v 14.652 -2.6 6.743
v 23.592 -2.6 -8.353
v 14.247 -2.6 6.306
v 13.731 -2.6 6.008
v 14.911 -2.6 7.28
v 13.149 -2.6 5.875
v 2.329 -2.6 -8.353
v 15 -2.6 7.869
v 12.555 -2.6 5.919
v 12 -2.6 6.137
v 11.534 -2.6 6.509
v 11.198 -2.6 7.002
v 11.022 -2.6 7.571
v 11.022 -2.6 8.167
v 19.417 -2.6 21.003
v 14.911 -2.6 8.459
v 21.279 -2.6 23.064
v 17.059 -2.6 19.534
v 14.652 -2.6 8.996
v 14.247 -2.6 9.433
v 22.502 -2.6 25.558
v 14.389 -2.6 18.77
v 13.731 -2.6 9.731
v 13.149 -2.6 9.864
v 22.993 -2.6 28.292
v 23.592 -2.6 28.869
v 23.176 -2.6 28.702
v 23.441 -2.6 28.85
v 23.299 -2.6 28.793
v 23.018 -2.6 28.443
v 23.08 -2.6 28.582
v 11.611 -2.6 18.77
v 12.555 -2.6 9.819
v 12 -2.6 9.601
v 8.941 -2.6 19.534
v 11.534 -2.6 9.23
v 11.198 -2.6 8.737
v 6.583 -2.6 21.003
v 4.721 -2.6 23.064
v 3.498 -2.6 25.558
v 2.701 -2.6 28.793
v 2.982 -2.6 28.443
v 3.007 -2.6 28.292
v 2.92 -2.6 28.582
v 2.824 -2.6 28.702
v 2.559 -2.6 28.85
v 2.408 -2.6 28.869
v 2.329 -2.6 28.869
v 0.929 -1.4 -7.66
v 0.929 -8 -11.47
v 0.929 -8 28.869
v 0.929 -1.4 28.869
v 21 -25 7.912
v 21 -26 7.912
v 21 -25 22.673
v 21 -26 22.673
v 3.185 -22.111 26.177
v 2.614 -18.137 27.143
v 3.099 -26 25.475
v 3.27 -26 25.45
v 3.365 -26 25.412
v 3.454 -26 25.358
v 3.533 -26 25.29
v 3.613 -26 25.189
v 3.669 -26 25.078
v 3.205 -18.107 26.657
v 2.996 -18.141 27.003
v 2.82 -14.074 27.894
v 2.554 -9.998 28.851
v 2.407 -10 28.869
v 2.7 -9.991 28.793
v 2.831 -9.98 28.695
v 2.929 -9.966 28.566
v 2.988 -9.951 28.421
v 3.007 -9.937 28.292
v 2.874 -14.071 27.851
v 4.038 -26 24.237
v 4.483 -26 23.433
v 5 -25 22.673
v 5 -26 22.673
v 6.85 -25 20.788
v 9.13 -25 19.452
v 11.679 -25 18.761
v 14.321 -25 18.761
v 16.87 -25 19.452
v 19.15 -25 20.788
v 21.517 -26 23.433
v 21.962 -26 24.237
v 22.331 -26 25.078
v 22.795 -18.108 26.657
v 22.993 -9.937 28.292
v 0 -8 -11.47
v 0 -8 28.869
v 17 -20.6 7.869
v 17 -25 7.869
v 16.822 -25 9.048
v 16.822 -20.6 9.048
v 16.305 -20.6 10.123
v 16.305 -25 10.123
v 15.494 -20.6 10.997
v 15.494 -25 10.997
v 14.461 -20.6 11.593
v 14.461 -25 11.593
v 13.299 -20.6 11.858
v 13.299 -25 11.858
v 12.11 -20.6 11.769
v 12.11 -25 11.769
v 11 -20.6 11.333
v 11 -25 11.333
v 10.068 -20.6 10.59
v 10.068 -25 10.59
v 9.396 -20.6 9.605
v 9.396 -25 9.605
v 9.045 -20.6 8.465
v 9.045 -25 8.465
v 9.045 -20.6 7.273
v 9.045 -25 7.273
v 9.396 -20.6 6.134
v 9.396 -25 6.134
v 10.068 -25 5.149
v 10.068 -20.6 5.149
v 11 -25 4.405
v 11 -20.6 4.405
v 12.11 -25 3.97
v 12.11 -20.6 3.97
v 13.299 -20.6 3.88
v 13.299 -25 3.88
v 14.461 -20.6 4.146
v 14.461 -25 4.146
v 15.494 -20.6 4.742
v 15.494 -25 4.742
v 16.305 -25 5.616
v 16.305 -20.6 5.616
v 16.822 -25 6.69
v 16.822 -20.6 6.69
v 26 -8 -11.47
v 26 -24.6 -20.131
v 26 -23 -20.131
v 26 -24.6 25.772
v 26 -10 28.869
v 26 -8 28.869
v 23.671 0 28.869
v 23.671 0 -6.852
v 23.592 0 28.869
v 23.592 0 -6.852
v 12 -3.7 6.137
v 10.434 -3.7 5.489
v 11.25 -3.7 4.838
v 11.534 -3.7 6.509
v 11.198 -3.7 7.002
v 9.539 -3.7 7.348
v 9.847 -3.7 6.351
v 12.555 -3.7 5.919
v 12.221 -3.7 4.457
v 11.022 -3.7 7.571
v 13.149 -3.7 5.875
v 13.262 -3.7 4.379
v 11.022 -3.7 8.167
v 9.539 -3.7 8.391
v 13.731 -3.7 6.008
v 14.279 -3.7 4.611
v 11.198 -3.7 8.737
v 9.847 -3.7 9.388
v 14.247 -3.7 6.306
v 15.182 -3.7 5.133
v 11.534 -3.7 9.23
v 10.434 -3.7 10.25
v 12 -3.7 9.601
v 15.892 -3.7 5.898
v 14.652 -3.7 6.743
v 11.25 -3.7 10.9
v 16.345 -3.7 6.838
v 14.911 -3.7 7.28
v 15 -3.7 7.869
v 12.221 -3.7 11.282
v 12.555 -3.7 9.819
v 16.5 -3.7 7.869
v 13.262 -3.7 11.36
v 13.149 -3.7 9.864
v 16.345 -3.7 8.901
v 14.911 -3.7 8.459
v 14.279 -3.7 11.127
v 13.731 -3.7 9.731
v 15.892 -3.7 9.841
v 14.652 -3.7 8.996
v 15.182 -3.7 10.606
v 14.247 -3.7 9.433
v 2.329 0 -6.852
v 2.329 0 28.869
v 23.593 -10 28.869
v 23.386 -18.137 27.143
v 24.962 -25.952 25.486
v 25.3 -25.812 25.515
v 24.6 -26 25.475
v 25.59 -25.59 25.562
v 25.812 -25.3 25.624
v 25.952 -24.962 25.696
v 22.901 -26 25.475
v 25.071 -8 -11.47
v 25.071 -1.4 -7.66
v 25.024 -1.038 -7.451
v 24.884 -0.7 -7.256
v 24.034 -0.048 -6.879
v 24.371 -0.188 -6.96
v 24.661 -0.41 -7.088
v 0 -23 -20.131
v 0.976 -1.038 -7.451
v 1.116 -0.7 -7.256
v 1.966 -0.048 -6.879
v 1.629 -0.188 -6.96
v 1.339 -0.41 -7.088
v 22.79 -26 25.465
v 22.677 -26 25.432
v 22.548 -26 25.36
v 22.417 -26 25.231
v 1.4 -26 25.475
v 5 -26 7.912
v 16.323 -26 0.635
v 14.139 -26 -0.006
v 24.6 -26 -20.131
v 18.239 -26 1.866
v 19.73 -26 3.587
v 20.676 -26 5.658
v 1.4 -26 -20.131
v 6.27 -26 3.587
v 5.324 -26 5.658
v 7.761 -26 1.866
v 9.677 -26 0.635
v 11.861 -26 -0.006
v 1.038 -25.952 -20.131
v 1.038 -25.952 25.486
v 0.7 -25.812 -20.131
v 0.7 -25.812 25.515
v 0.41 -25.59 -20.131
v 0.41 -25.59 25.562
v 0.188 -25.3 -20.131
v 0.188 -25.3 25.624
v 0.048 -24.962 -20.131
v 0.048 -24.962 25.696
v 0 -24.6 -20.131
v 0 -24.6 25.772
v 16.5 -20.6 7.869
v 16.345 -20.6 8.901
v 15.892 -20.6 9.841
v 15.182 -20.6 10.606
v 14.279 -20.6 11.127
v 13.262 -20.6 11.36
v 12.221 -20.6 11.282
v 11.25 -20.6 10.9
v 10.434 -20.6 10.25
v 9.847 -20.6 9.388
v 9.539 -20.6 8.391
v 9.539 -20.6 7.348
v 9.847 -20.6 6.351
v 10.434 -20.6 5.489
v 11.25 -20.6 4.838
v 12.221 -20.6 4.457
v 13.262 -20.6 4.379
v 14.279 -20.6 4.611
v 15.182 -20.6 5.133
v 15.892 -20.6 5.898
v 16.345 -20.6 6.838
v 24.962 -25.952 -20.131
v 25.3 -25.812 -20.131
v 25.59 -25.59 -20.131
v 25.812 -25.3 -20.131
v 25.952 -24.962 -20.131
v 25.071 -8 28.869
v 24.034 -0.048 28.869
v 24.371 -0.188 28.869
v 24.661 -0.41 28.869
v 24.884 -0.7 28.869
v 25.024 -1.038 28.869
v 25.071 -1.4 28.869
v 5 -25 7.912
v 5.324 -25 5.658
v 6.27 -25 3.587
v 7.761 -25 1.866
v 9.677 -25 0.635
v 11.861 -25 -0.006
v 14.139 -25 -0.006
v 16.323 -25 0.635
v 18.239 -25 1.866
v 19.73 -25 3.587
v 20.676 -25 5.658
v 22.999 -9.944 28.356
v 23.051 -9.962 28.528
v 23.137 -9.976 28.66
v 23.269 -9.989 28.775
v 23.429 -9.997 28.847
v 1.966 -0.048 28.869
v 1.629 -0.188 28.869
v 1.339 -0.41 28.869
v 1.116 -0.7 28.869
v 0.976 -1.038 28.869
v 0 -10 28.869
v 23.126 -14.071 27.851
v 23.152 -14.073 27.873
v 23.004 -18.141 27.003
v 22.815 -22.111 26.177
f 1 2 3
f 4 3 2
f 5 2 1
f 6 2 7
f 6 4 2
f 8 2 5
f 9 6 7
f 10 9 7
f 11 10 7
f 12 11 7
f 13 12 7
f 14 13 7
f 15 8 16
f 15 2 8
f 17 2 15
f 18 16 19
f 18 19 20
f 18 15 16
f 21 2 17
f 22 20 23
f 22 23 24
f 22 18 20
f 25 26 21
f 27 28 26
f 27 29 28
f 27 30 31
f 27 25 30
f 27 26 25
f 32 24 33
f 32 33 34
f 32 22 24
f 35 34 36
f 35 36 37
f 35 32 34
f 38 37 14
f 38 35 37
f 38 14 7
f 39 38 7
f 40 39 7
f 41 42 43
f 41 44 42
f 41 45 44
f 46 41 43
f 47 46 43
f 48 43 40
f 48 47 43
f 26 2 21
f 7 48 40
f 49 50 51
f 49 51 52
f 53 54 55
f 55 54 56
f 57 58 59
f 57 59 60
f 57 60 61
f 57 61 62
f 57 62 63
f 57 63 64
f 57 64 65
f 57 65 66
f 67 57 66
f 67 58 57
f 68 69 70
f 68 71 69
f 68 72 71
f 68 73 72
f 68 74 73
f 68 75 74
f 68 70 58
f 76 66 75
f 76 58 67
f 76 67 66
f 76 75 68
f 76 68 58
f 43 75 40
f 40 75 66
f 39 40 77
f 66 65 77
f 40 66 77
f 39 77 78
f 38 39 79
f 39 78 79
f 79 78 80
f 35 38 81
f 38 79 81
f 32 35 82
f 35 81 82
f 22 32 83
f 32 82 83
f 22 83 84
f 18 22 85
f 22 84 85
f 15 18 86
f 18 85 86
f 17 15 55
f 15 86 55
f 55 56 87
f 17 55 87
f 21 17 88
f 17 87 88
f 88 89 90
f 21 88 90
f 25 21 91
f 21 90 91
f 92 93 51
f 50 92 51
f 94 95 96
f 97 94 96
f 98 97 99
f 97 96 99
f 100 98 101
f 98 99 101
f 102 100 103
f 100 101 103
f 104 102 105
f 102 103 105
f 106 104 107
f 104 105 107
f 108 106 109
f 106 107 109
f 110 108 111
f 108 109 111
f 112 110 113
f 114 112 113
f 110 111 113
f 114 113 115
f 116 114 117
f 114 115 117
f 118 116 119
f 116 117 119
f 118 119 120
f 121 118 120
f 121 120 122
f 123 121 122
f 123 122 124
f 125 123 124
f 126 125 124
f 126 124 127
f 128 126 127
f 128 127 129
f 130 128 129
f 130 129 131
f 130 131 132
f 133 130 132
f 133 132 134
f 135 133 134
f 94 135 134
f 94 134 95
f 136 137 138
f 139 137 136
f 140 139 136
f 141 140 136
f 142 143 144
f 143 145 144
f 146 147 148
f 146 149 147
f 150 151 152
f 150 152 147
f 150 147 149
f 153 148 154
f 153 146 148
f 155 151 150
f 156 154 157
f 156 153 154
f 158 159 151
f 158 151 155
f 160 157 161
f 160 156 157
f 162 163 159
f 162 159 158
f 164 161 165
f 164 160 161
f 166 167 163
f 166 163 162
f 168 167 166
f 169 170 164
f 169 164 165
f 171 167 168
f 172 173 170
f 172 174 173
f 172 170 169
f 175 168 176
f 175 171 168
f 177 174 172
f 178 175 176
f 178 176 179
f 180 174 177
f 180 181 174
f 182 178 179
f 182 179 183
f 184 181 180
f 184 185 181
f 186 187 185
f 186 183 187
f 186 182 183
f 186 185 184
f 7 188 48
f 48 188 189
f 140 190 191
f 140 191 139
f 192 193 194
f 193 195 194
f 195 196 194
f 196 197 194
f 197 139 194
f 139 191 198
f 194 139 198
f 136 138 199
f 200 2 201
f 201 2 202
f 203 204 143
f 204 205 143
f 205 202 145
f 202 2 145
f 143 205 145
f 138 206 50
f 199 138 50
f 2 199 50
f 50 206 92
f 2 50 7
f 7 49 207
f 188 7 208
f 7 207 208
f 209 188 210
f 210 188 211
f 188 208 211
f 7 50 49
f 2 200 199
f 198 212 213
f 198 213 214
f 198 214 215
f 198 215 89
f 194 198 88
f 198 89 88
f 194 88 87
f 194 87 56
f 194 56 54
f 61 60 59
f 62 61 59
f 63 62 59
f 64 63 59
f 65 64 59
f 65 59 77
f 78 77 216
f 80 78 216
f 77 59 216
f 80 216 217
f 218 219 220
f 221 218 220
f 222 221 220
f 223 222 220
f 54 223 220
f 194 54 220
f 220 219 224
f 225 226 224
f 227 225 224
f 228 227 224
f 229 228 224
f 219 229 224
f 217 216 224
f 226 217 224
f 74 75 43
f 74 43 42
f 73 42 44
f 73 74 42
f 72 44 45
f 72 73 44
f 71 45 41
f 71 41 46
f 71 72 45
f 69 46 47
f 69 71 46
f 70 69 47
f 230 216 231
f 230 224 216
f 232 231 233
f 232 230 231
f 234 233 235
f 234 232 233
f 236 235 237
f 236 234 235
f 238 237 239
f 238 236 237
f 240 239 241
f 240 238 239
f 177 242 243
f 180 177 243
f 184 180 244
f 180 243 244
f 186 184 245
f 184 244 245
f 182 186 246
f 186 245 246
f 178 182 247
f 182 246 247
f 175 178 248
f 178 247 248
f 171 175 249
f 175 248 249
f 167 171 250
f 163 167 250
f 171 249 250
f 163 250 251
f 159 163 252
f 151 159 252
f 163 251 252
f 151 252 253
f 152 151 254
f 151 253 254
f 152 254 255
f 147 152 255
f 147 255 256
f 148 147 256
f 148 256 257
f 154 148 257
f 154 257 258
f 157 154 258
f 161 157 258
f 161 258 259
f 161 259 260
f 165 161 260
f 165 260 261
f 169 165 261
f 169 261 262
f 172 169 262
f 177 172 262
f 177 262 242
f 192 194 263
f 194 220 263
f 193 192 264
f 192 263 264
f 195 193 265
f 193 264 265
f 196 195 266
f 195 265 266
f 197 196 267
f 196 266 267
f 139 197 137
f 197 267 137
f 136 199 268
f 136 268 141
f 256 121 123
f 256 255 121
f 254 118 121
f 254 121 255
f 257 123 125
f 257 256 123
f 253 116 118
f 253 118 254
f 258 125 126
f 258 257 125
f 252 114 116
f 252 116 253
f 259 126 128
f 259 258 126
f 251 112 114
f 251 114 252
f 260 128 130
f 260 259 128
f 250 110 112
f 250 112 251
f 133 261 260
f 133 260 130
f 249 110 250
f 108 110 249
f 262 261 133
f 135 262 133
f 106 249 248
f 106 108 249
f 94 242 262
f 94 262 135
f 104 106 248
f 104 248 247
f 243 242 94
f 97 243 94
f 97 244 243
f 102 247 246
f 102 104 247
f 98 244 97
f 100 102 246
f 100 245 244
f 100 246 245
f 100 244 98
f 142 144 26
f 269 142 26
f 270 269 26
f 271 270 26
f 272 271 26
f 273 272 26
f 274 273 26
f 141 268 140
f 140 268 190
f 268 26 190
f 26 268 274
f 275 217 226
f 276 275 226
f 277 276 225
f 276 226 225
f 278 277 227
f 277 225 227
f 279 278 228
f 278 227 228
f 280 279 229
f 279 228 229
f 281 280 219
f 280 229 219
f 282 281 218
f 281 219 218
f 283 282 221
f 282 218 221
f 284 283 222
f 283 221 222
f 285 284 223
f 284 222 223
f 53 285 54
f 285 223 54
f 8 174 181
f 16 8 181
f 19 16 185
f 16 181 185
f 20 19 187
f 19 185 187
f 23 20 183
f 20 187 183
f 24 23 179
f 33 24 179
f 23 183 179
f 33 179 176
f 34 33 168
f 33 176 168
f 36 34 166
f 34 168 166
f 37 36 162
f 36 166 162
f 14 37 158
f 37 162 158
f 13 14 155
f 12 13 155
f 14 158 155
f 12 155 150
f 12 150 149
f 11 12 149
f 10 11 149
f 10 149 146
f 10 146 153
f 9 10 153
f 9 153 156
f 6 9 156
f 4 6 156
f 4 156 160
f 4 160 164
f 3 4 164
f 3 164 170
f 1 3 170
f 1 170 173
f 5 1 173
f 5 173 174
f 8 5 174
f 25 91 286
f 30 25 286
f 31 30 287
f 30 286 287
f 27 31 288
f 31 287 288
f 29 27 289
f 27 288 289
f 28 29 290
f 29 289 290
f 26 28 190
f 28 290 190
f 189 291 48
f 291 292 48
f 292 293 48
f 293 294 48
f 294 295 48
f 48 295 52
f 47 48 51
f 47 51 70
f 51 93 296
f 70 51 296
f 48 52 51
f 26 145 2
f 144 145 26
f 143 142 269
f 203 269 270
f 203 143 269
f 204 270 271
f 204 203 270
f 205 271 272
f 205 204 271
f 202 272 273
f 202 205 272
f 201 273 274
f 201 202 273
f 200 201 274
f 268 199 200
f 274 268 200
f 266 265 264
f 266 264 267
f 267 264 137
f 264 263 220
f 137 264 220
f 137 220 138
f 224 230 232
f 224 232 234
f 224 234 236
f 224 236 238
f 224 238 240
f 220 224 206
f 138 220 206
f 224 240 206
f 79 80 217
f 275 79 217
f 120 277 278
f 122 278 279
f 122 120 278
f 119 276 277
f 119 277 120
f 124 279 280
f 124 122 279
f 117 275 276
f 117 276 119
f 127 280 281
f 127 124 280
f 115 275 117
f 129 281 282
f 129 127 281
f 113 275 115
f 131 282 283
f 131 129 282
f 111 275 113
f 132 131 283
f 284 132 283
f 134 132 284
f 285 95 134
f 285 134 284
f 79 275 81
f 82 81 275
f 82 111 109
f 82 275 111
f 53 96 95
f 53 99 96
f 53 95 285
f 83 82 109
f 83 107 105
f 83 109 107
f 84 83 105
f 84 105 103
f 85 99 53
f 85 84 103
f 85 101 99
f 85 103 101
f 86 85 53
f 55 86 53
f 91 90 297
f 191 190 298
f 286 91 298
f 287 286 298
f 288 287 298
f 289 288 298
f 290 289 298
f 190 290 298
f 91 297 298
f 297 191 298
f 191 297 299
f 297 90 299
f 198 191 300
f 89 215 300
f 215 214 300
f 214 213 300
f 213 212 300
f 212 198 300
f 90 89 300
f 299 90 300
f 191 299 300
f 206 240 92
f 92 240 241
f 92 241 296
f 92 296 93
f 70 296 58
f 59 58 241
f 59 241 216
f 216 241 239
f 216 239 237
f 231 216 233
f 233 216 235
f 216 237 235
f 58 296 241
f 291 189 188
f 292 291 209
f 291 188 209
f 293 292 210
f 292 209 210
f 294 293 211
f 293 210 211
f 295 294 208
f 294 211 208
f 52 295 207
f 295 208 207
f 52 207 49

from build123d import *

# Parameters (mm, degrees)
F1_DEPTH  = 26
F2_R      = 10
F2_R_2    = 2
F3_DEPTH  = 26
F4_R      = 3.5
F4_R_2    = 2
F5_DEPTH  = 22.3
F6_R      = 4
F6_R_2    = 3.5
F7_DEPTH  = 5.4
F8_R      = 0.6
F9_W      = 0.9285709113
F9_H      = 8
F10_DEPTH = 61.5
F11_R     = 1.4
F12_W     = 21.2637362675
F12_H     = 42.3296708614
F13_DEPTH = 2.6
F15_DEPTH = 1


with BuildPart() as f1:
    # F0 (on Right) → F1 (new body)
    with BuildSketch(Plane.YZ):
        Polygon((-10, 28.8693108244), (-26, 25.475452911), (-26, -20.1306891756), (-23, -20.1306891756), (0, -6.8516329843), (0, 28.8693108244), align=None)
    extrude(amount=F1_DEPTH)

    # F2 (on face) → F3 (cut)
    with BuildSketch(Plane.XZ.offset(26)):
        with Locations((13, 28.6730788648)):
            Circle(F2_R)
        with Locations((13, 7.8693108244)):
            Circle(F2_R_2)
    extrude(amount=-F3_DEPTH, mode=Mode.SUBTRACT)

    # F4 (on face) → F5 (cut)
    with BuildSketch(Plane.XZ.offset(26)):
        with Locations((13, 7.8693108244)):
            Circle(F4_R)
        with Locations((13, 7.8693108244)):
            Circle(F4_R_2, mode=Mode.SUBTRACT)
    extrude(amount=-F5_DEPTH, mode=Mode.SUBTRACT)

    # F6 (on face) → F7 (cut)
    with BuildSketch(Plane.XZ.offset(26)):
        with Locations((13, 7.8693108244)):
            Circle(F6_R)
        with Locations((13, 7.8693108244)):
            Circle(F6_R_2, mode=Mode.SUBTRACT)
    extrude(amount=-F7_DEPTH, mode=Mode.SUBTRACT)

    # F8
    f8_edges = [f1.edges().sort_by_distance(p)[0] for p in [
        (3.113398, -18.00473, 27.171379),
        (22.999519, -10.462557, 28.771195),
        (22.871208, -18.467044, 27.073314),
        (3.001926, -5, 28.869311),
        (22.998074, -5, 28.869311),
    ]]
    fillet(f8_edges, radius=F8_R)

    # F9 (on face) → F10 (cut)
    with BuildSketch(Plane.XY.offset(28.8693108244)):
        with Locations((25.5357145444, -4)):
            Rectangle(F9_W, F9_H)
        with Locations((0.4642854556, -4)):
            Rectangle(F9_W, F9_H)
    extrude(amount=-F10_DEPTH, mode=Mode.SUBTRACT)

    # F11
    f11_edges = [f1.edges().sort_by_distance(p)[0] for p in [
        (0, -26, 2.672382),
        (26, -26, 2.672382),
        (0.928571, 0, 11.008839),
        (25.071429, 0, 11.008839),
    ]]
    fillet(f11_edges, radius=F11_R)

    # F12 (on face) → F13 (cut)
    with BuildSketch(Plane(origin=(0, 0, 0), x_dir=(-1, 0, 0), z_dir=(0, 1, 0))):
        with Locations((-12.960439045, 10.5494512245)):
            Rectangle(F12_W, F12_H)
    extrude(amount=-F13_DEPTH, mode=Mode.SUBTRACT)

    # F14 (on face) → F15 (cut)
    with BuildSketch(Plane.XZ.offset(26)):
        with BuildLine():
            ThreePointArc((5, 7.9120891169), (13, -0.0879108831), (21, 7.9120891169))
            ThreePointArc((21, 7.9120891169), (13, 15.9120891169), (5, 7.9120891169))
        make_face()
        with BuildLine():
            ThreePointArc((5, 7.9120891169), (13, 15.9120891169), (21, 7.9120891169))
            Line((21, 7.9120891169), (21, 25.7802214473))
            Line((21, 25.7802214473), (5, 25.7802214473))
            Line((5, 25.7802214473), (5, 7.9120891169))
        make_face()
    extrude(amount=-F15_DEPTH, mode=Mode.SUBTRACT)


solid = f1.part
